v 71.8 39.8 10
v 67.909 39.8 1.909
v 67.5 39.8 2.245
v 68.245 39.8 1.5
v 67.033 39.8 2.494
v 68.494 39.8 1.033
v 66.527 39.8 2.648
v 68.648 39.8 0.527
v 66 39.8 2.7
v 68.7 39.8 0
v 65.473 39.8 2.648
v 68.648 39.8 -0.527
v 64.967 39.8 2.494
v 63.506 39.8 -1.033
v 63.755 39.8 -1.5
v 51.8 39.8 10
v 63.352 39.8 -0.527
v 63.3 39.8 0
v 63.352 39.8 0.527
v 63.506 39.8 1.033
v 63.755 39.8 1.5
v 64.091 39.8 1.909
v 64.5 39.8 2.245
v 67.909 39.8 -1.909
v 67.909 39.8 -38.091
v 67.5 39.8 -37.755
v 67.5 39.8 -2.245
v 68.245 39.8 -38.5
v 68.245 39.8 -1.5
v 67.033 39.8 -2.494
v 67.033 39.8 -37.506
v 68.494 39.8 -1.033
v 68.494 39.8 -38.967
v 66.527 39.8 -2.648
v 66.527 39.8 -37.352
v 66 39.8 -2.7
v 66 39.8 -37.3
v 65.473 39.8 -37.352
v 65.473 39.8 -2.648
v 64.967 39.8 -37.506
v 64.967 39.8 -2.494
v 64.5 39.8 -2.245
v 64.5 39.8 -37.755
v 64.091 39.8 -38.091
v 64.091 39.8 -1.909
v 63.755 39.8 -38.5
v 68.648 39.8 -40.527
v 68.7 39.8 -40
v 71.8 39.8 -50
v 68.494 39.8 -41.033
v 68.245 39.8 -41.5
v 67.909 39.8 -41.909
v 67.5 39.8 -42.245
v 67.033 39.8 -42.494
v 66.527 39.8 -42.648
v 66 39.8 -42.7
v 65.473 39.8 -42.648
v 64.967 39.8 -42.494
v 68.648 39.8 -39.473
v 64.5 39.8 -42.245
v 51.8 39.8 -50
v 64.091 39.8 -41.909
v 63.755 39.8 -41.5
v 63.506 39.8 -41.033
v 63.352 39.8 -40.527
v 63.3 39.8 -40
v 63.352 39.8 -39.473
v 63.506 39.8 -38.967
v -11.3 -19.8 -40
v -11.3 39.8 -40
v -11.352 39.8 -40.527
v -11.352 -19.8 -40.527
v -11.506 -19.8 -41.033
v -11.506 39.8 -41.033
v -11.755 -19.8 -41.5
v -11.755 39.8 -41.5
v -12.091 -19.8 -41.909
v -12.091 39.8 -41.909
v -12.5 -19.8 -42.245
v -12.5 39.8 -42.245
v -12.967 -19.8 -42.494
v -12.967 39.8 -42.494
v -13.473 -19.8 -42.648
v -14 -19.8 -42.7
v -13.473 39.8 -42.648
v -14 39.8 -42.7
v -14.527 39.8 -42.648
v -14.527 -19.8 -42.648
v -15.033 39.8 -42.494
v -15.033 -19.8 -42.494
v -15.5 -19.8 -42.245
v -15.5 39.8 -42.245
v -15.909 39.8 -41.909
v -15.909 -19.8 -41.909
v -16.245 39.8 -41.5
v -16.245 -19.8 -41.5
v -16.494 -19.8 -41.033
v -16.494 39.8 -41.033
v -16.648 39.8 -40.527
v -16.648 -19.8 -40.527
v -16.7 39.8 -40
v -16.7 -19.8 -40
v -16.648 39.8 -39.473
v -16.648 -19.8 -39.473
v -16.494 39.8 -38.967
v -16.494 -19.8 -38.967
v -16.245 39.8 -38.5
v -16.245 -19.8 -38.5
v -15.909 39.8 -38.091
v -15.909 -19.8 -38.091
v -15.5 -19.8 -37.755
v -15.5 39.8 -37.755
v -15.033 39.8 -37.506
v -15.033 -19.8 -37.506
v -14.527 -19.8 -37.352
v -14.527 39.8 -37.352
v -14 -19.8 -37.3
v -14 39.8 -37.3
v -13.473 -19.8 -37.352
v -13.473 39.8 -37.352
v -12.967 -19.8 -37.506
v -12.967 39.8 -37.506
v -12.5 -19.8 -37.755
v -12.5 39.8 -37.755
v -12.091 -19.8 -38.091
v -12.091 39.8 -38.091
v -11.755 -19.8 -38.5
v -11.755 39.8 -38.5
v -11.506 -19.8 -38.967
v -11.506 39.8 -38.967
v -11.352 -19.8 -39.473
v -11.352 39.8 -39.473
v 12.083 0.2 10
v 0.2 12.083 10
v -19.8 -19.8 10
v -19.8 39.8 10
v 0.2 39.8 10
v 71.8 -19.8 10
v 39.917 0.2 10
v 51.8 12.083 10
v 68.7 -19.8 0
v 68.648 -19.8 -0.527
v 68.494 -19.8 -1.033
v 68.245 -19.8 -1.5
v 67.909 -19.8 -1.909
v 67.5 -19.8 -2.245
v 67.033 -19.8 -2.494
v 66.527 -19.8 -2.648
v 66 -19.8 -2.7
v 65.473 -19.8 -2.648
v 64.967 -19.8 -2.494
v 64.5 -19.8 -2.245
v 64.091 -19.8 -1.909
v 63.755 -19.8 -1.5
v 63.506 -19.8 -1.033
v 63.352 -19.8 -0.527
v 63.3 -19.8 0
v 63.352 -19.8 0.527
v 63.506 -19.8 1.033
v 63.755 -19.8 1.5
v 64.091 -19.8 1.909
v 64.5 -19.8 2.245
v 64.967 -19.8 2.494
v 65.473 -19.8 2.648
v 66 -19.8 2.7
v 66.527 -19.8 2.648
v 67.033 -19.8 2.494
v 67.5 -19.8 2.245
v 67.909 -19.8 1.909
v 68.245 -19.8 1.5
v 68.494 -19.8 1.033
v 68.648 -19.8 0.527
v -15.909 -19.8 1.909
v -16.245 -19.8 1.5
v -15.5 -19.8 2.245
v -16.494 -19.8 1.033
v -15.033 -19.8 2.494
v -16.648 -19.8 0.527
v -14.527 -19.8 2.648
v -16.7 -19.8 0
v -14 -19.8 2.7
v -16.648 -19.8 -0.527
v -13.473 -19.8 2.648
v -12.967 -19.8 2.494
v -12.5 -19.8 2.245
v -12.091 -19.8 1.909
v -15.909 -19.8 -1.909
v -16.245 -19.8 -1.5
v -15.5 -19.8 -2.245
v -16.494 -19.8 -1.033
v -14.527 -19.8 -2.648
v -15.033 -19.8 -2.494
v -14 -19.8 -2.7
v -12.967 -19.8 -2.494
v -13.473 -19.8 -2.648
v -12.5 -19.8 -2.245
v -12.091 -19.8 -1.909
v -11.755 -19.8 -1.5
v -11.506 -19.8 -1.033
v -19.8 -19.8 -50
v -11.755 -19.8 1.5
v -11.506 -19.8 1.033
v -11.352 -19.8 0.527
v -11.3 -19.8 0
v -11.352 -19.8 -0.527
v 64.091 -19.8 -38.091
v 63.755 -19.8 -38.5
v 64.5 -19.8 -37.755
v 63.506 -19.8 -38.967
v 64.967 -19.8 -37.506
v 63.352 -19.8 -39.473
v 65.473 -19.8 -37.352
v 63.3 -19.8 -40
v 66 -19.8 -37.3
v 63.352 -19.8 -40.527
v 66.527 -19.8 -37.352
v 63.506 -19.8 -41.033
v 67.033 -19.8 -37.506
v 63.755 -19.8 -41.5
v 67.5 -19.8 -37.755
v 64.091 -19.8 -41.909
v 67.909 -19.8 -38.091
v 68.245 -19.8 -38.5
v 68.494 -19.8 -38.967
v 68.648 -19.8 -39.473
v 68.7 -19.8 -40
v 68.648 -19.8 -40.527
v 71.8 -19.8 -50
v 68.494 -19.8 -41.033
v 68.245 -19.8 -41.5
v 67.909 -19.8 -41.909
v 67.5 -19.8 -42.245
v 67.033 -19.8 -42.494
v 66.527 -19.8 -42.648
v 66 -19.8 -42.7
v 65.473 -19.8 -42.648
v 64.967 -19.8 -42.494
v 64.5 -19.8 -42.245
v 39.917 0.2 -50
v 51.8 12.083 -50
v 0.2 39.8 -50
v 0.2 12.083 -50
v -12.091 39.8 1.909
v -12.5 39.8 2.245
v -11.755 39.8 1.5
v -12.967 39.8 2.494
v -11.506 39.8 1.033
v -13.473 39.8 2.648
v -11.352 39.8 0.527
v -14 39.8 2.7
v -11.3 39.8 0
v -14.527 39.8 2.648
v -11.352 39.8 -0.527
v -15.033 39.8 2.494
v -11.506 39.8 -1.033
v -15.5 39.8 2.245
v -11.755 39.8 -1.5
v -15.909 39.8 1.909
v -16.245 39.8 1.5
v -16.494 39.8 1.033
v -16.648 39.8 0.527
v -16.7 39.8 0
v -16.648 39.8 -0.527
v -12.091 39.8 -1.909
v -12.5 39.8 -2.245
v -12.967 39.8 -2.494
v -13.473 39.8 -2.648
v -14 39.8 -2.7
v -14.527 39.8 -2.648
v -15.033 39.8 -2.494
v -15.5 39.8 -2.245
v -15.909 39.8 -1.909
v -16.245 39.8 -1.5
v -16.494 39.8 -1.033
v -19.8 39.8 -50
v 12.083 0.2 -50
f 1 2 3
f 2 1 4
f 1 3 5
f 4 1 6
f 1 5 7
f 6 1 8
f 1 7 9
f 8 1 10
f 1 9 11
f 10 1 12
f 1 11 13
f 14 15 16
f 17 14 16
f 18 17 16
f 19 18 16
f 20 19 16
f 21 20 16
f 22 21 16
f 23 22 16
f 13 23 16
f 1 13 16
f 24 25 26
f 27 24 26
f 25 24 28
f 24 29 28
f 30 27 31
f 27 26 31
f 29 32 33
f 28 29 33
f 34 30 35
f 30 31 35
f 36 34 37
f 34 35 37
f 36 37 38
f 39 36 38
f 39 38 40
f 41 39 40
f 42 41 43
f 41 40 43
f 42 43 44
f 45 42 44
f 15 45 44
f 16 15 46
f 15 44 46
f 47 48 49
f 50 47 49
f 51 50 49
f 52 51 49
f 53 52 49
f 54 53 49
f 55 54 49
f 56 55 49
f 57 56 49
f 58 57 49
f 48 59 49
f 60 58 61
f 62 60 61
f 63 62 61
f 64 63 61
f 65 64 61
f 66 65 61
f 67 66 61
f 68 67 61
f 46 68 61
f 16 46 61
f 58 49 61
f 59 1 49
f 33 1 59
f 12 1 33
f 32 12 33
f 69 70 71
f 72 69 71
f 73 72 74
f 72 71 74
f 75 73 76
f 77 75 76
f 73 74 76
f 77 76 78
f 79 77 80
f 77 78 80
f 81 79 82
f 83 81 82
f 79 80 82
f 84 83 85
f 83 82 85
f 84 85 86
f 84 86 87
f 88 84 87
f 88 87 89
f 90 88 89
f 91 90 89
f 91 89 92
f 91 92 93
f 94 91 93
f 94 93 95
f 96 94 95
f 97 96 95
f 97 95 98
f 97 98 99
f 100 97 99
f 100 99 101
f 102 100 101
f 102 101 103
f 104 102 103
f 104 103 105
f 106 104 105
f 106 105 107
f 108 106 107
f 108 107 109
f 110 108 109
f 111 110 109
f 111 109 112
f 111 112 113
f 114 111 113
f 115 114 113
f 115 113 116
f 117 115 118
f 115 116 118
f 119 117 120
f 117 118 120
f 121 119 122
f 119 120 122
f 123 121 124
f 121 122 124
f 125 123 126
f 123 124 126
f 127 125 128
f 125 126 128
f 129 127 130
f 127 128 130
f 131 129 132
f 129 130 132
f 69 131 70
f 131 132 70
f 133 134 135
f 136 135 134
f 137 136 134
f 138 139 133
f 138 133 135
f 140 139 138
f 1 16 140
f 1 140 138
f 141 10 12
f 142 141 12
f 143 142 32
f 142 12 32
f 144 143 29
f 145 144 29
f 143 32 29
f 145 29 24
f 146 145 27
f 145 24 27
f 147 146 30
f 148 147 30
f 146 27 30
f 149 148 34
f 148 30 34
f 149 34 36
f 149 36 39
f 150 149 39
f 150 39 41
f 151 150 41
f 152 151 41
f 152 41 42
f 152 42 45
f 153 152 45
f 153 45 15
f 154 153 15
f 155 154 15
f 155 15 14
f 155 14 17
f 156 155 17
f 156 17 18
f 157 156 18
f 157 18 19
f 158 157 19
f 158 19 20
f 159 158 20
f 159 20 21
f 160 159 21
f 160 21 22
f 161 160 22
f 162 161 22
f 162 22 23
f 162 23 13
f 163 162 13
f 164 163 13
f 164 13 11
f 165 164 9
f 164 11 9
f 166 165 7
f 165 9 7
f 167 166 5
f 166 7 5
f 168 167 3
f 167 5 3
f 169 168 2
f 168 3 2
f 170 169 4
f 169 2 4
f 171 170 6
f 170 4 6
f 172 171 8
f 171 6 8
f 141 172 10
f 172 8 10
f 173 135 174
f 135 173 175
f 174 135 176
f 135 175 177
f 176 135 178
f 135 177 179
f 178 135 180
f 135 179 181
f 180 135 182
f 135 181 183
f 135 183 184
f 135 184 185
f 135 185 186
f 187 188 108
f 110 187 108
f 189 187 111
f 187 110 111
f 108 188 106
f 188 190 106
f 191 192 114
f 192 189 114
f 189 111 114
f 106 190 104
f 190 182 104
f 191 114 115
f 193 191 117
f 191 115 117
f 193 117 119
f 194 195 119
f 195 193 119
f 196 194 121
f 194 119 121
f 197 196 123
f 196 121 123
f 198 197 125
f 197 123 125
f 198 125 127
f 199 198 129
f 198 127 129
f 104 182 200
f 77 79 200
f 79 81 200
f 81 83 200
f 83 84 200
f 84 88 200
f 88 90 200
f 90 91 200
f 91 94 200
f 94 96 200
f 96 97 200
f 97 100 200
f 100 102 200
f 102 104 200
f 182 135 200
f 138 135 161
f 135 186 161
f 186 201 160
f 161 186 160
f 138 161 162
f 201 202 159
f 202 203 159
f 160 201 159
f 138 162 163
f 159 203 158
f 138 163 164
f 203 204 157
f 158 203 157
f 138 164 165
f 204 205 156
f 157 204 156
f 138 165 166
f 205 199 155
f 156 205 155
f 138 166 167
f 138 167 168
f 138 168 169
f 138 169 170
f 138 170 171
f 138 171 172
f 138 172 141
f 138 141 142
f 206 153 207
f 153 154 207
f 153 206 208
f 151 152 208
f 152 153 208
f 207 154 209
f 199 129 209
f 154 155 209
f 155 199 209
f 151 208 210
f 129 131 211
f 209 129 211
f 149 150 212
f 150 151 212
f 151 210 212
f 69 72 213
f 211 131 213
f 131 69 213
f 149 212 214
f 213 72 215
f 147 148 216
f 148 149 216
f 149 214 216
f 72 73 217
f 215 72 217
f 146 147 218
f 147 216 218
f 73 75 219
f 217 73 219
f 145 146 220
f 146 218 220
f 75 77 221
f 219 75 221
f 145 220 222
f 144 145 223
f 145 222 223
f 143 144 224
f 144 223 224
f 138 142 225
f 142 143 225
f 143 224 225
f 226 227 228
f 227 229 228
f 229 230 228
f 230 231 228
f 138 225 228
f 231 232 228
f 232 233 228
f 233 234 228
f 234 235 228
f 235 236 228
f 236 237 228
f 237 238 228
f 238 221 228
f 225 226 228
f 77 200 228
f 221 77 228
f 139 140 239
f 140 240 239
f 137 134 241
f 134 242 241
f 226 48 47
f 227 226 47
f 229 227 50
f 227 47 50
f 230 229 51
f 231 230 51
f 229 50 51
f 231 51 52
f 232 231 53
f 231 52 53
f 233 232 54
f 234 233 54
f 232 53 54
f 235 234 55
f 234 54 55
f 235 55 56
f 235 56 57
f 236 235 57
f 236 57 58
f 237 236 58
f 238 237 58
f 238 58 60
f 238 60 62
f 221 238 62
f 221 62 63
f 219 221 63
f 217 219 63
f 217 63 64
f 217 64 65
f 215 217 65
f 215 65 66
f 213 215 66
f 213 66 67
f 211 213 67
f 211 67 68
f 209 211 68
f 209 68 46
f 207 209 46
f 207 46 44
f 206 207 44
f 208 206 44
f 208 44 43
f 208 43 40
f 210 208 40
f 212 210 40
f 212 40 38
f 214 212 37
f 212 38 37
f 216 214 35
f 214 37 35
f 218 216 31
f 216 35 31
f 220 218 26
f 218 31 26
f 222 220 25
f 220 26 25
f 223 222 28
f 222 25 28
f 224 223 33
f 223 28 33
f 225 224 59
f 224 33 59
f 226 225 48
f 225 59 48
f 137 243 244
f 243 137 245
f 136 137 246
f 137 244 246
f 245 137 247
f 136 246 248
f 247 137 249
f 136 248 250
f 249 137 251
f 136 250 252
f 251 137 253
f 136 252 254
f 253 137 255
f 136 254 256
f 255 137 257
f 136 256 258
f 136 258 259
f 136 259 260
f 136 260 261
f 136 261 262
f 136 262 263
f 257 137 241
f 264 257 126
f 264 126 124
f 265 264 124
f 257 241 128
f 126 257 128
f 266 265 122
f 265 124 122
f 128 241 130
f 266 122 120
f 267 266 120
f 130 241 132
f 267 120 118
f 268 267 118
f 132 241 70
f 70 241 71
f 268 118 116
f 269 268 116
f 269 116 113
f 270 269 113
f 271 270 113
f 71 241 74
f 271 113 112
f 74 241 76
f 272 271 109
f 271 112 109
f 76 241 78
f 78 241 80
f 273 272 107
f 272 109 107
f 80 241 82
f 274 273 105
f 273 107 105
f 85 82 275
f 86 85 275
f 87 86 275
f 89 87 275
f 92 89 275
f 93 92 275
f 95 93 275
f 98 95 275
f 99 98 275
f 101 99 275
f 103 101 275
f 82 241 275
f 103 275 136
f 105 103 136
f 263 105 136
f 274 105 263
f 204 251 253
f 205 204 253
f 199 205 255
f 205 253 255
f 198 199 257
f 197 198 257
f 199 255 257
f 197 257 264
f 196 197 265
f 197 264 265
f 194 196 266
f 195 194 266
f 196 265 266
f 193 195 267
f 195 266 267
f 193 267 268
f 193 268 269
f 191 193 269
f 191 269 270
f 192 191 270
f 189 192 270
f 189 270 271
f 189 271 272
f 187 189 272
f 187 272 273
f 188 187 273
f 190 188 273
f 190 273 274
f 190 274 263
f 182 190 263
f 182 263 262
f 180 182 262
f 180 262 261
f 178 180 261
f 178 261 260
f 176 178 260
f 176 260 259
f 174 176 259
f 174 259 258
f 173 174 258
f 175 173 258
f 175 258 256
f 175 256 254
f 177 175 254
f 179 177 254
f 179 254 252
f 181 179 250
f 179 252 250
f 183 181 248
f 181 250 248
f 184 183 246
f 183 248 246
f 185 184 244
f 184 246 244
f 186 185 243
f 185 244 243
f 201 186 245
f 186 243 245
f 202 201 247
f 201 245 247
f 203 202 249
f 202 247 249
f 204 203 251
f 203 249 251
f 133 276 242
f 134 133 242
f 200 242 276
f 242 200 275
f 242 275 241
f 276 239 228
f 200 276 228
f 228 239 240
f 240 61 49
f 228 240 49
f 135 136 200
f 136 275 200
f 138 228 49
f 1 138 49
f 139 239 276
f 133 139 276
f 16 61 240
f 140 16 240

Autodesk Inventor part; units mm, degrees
ref_plane "YZ Plane" through (0, 0, 0) normal (1, 0, 0) x (0, 1, 0)
ref_plane "XZ Plane" through (0, 0, 0) normal (0, 1, 0) x (-1, 0, 0)
ref_plane "Plano de trabajo1" through (0, -0.4184, 0) normal (0, 0, 1) x (1, 0, 0)
sketch "Boceto1" plane through (0, -0.4184, 0) normal (0, 0, 1) x (1, 0, 0)
  line L0 (51.8, 12.5012) -> (51.8, 40.2184) projected
  line L1 (51.8, 40.2184) -> (0.2, 40.2184) projected
  line L2 (0.2, 40.2184) -> (0.2, 12.5012) projected
  line L3 (0.2, 12.5012) -> (12.0828, 0.6184) projected
  line L4 (12.0828, 0.6184) -> (39.9172, 0.6184) projected
  line L5 (39.9172, 0.6184) -> (51.8, 12.5012) projected
  circle A0 centre (26, 20.4184) radius 14.2 projected
  line L6 (71.8, 40.2184) -> (-19.8, 40.2184)
  line L7 (-19.8, 40.2184) -> (-19.8, -19.3816)
  line L8 (-19.8, -19.3816) -> (71.8, -19.3816)
  line L9 (71.8, -19.3816) -> (71.8, 40.2184)
  point P0 (0, 0.4184)
  point P1 (0.2, 40.2184)
  point P2 (51.8, 40.2184)
  dimension "d0" = 20
  dimension "d1" = 20
  dimension "d2" = 20
extrude "Extrusión1" add sketch "Boceto1" against normal blind 40 contours L0 L6 L9 L8 L7 L2 L3 L4 L5
sketch "Boceto2" plane through (0, -0.4184, 0) normal (0, 0, 1) x (1, 0, 0)
  line L0 (39.9172, 0.6184) -> (12.0828, 0.6184) projected
  line L1 (12.0828, 0.6184) -> (0.2, 12.5012) projected
  line L2 (0.2, 12.5012) -> (0.2, 40.2184) projected
  line L3 (0.2, 40.2184) -> (-19.8, 40.2184) projected
  line L4 (-19.8, 40.2184) -> (-19.8, -19.3816) projected
  line L5 (-19.8, -19.3816) -> (71.8, -19.3816) projected
  line L6 (71.8, -19.3816) -> (71.8, 40.2184) projected
  line L7 (71.8, 40.2184) -> (51.8, 40.2184) projected
  line L8 (51.8, 40.2184) -> (51.8, 12.5012) projected
  line L9 (51.8, 12.5012) -> (39.9172, 0.6184) projected
  point P0 (0, 0.4184)
extrude "Extrusión2" add sketch "Boceto2" along normal blind 10 and the other way blind 50
sketch "Boceto3" plane through (-19.8, 39.8, -50) normal (0, 1, 0) x (1, 0, 0)
  circle A0 centre (5.8, -10) radius 2.7
  circle A1 centre (5.8, -50) radius 2.7
  circle A2 centre (85.8, -10) radius 2.7
  circle A3 centre (85.8, -50) radius 2.7
  line L0 (0, 0) -> (20, 0) projected
  line L1 (59.7172, -60) -> (31.8828, -60) projected
  line L2 (45.8, -60) -> (45.8, 0)
  point P0 (19.8, -50)
  dimension "d9" = 80
  dimension "d10" = 5.4
  dimension "d11" = 40
  dimension "d12" = 10
  dimension "d13" = 40
extrude "Extrusión3" cut sketch "Boceto3" against normal through all
properties part number "UpperJawsuuport"
